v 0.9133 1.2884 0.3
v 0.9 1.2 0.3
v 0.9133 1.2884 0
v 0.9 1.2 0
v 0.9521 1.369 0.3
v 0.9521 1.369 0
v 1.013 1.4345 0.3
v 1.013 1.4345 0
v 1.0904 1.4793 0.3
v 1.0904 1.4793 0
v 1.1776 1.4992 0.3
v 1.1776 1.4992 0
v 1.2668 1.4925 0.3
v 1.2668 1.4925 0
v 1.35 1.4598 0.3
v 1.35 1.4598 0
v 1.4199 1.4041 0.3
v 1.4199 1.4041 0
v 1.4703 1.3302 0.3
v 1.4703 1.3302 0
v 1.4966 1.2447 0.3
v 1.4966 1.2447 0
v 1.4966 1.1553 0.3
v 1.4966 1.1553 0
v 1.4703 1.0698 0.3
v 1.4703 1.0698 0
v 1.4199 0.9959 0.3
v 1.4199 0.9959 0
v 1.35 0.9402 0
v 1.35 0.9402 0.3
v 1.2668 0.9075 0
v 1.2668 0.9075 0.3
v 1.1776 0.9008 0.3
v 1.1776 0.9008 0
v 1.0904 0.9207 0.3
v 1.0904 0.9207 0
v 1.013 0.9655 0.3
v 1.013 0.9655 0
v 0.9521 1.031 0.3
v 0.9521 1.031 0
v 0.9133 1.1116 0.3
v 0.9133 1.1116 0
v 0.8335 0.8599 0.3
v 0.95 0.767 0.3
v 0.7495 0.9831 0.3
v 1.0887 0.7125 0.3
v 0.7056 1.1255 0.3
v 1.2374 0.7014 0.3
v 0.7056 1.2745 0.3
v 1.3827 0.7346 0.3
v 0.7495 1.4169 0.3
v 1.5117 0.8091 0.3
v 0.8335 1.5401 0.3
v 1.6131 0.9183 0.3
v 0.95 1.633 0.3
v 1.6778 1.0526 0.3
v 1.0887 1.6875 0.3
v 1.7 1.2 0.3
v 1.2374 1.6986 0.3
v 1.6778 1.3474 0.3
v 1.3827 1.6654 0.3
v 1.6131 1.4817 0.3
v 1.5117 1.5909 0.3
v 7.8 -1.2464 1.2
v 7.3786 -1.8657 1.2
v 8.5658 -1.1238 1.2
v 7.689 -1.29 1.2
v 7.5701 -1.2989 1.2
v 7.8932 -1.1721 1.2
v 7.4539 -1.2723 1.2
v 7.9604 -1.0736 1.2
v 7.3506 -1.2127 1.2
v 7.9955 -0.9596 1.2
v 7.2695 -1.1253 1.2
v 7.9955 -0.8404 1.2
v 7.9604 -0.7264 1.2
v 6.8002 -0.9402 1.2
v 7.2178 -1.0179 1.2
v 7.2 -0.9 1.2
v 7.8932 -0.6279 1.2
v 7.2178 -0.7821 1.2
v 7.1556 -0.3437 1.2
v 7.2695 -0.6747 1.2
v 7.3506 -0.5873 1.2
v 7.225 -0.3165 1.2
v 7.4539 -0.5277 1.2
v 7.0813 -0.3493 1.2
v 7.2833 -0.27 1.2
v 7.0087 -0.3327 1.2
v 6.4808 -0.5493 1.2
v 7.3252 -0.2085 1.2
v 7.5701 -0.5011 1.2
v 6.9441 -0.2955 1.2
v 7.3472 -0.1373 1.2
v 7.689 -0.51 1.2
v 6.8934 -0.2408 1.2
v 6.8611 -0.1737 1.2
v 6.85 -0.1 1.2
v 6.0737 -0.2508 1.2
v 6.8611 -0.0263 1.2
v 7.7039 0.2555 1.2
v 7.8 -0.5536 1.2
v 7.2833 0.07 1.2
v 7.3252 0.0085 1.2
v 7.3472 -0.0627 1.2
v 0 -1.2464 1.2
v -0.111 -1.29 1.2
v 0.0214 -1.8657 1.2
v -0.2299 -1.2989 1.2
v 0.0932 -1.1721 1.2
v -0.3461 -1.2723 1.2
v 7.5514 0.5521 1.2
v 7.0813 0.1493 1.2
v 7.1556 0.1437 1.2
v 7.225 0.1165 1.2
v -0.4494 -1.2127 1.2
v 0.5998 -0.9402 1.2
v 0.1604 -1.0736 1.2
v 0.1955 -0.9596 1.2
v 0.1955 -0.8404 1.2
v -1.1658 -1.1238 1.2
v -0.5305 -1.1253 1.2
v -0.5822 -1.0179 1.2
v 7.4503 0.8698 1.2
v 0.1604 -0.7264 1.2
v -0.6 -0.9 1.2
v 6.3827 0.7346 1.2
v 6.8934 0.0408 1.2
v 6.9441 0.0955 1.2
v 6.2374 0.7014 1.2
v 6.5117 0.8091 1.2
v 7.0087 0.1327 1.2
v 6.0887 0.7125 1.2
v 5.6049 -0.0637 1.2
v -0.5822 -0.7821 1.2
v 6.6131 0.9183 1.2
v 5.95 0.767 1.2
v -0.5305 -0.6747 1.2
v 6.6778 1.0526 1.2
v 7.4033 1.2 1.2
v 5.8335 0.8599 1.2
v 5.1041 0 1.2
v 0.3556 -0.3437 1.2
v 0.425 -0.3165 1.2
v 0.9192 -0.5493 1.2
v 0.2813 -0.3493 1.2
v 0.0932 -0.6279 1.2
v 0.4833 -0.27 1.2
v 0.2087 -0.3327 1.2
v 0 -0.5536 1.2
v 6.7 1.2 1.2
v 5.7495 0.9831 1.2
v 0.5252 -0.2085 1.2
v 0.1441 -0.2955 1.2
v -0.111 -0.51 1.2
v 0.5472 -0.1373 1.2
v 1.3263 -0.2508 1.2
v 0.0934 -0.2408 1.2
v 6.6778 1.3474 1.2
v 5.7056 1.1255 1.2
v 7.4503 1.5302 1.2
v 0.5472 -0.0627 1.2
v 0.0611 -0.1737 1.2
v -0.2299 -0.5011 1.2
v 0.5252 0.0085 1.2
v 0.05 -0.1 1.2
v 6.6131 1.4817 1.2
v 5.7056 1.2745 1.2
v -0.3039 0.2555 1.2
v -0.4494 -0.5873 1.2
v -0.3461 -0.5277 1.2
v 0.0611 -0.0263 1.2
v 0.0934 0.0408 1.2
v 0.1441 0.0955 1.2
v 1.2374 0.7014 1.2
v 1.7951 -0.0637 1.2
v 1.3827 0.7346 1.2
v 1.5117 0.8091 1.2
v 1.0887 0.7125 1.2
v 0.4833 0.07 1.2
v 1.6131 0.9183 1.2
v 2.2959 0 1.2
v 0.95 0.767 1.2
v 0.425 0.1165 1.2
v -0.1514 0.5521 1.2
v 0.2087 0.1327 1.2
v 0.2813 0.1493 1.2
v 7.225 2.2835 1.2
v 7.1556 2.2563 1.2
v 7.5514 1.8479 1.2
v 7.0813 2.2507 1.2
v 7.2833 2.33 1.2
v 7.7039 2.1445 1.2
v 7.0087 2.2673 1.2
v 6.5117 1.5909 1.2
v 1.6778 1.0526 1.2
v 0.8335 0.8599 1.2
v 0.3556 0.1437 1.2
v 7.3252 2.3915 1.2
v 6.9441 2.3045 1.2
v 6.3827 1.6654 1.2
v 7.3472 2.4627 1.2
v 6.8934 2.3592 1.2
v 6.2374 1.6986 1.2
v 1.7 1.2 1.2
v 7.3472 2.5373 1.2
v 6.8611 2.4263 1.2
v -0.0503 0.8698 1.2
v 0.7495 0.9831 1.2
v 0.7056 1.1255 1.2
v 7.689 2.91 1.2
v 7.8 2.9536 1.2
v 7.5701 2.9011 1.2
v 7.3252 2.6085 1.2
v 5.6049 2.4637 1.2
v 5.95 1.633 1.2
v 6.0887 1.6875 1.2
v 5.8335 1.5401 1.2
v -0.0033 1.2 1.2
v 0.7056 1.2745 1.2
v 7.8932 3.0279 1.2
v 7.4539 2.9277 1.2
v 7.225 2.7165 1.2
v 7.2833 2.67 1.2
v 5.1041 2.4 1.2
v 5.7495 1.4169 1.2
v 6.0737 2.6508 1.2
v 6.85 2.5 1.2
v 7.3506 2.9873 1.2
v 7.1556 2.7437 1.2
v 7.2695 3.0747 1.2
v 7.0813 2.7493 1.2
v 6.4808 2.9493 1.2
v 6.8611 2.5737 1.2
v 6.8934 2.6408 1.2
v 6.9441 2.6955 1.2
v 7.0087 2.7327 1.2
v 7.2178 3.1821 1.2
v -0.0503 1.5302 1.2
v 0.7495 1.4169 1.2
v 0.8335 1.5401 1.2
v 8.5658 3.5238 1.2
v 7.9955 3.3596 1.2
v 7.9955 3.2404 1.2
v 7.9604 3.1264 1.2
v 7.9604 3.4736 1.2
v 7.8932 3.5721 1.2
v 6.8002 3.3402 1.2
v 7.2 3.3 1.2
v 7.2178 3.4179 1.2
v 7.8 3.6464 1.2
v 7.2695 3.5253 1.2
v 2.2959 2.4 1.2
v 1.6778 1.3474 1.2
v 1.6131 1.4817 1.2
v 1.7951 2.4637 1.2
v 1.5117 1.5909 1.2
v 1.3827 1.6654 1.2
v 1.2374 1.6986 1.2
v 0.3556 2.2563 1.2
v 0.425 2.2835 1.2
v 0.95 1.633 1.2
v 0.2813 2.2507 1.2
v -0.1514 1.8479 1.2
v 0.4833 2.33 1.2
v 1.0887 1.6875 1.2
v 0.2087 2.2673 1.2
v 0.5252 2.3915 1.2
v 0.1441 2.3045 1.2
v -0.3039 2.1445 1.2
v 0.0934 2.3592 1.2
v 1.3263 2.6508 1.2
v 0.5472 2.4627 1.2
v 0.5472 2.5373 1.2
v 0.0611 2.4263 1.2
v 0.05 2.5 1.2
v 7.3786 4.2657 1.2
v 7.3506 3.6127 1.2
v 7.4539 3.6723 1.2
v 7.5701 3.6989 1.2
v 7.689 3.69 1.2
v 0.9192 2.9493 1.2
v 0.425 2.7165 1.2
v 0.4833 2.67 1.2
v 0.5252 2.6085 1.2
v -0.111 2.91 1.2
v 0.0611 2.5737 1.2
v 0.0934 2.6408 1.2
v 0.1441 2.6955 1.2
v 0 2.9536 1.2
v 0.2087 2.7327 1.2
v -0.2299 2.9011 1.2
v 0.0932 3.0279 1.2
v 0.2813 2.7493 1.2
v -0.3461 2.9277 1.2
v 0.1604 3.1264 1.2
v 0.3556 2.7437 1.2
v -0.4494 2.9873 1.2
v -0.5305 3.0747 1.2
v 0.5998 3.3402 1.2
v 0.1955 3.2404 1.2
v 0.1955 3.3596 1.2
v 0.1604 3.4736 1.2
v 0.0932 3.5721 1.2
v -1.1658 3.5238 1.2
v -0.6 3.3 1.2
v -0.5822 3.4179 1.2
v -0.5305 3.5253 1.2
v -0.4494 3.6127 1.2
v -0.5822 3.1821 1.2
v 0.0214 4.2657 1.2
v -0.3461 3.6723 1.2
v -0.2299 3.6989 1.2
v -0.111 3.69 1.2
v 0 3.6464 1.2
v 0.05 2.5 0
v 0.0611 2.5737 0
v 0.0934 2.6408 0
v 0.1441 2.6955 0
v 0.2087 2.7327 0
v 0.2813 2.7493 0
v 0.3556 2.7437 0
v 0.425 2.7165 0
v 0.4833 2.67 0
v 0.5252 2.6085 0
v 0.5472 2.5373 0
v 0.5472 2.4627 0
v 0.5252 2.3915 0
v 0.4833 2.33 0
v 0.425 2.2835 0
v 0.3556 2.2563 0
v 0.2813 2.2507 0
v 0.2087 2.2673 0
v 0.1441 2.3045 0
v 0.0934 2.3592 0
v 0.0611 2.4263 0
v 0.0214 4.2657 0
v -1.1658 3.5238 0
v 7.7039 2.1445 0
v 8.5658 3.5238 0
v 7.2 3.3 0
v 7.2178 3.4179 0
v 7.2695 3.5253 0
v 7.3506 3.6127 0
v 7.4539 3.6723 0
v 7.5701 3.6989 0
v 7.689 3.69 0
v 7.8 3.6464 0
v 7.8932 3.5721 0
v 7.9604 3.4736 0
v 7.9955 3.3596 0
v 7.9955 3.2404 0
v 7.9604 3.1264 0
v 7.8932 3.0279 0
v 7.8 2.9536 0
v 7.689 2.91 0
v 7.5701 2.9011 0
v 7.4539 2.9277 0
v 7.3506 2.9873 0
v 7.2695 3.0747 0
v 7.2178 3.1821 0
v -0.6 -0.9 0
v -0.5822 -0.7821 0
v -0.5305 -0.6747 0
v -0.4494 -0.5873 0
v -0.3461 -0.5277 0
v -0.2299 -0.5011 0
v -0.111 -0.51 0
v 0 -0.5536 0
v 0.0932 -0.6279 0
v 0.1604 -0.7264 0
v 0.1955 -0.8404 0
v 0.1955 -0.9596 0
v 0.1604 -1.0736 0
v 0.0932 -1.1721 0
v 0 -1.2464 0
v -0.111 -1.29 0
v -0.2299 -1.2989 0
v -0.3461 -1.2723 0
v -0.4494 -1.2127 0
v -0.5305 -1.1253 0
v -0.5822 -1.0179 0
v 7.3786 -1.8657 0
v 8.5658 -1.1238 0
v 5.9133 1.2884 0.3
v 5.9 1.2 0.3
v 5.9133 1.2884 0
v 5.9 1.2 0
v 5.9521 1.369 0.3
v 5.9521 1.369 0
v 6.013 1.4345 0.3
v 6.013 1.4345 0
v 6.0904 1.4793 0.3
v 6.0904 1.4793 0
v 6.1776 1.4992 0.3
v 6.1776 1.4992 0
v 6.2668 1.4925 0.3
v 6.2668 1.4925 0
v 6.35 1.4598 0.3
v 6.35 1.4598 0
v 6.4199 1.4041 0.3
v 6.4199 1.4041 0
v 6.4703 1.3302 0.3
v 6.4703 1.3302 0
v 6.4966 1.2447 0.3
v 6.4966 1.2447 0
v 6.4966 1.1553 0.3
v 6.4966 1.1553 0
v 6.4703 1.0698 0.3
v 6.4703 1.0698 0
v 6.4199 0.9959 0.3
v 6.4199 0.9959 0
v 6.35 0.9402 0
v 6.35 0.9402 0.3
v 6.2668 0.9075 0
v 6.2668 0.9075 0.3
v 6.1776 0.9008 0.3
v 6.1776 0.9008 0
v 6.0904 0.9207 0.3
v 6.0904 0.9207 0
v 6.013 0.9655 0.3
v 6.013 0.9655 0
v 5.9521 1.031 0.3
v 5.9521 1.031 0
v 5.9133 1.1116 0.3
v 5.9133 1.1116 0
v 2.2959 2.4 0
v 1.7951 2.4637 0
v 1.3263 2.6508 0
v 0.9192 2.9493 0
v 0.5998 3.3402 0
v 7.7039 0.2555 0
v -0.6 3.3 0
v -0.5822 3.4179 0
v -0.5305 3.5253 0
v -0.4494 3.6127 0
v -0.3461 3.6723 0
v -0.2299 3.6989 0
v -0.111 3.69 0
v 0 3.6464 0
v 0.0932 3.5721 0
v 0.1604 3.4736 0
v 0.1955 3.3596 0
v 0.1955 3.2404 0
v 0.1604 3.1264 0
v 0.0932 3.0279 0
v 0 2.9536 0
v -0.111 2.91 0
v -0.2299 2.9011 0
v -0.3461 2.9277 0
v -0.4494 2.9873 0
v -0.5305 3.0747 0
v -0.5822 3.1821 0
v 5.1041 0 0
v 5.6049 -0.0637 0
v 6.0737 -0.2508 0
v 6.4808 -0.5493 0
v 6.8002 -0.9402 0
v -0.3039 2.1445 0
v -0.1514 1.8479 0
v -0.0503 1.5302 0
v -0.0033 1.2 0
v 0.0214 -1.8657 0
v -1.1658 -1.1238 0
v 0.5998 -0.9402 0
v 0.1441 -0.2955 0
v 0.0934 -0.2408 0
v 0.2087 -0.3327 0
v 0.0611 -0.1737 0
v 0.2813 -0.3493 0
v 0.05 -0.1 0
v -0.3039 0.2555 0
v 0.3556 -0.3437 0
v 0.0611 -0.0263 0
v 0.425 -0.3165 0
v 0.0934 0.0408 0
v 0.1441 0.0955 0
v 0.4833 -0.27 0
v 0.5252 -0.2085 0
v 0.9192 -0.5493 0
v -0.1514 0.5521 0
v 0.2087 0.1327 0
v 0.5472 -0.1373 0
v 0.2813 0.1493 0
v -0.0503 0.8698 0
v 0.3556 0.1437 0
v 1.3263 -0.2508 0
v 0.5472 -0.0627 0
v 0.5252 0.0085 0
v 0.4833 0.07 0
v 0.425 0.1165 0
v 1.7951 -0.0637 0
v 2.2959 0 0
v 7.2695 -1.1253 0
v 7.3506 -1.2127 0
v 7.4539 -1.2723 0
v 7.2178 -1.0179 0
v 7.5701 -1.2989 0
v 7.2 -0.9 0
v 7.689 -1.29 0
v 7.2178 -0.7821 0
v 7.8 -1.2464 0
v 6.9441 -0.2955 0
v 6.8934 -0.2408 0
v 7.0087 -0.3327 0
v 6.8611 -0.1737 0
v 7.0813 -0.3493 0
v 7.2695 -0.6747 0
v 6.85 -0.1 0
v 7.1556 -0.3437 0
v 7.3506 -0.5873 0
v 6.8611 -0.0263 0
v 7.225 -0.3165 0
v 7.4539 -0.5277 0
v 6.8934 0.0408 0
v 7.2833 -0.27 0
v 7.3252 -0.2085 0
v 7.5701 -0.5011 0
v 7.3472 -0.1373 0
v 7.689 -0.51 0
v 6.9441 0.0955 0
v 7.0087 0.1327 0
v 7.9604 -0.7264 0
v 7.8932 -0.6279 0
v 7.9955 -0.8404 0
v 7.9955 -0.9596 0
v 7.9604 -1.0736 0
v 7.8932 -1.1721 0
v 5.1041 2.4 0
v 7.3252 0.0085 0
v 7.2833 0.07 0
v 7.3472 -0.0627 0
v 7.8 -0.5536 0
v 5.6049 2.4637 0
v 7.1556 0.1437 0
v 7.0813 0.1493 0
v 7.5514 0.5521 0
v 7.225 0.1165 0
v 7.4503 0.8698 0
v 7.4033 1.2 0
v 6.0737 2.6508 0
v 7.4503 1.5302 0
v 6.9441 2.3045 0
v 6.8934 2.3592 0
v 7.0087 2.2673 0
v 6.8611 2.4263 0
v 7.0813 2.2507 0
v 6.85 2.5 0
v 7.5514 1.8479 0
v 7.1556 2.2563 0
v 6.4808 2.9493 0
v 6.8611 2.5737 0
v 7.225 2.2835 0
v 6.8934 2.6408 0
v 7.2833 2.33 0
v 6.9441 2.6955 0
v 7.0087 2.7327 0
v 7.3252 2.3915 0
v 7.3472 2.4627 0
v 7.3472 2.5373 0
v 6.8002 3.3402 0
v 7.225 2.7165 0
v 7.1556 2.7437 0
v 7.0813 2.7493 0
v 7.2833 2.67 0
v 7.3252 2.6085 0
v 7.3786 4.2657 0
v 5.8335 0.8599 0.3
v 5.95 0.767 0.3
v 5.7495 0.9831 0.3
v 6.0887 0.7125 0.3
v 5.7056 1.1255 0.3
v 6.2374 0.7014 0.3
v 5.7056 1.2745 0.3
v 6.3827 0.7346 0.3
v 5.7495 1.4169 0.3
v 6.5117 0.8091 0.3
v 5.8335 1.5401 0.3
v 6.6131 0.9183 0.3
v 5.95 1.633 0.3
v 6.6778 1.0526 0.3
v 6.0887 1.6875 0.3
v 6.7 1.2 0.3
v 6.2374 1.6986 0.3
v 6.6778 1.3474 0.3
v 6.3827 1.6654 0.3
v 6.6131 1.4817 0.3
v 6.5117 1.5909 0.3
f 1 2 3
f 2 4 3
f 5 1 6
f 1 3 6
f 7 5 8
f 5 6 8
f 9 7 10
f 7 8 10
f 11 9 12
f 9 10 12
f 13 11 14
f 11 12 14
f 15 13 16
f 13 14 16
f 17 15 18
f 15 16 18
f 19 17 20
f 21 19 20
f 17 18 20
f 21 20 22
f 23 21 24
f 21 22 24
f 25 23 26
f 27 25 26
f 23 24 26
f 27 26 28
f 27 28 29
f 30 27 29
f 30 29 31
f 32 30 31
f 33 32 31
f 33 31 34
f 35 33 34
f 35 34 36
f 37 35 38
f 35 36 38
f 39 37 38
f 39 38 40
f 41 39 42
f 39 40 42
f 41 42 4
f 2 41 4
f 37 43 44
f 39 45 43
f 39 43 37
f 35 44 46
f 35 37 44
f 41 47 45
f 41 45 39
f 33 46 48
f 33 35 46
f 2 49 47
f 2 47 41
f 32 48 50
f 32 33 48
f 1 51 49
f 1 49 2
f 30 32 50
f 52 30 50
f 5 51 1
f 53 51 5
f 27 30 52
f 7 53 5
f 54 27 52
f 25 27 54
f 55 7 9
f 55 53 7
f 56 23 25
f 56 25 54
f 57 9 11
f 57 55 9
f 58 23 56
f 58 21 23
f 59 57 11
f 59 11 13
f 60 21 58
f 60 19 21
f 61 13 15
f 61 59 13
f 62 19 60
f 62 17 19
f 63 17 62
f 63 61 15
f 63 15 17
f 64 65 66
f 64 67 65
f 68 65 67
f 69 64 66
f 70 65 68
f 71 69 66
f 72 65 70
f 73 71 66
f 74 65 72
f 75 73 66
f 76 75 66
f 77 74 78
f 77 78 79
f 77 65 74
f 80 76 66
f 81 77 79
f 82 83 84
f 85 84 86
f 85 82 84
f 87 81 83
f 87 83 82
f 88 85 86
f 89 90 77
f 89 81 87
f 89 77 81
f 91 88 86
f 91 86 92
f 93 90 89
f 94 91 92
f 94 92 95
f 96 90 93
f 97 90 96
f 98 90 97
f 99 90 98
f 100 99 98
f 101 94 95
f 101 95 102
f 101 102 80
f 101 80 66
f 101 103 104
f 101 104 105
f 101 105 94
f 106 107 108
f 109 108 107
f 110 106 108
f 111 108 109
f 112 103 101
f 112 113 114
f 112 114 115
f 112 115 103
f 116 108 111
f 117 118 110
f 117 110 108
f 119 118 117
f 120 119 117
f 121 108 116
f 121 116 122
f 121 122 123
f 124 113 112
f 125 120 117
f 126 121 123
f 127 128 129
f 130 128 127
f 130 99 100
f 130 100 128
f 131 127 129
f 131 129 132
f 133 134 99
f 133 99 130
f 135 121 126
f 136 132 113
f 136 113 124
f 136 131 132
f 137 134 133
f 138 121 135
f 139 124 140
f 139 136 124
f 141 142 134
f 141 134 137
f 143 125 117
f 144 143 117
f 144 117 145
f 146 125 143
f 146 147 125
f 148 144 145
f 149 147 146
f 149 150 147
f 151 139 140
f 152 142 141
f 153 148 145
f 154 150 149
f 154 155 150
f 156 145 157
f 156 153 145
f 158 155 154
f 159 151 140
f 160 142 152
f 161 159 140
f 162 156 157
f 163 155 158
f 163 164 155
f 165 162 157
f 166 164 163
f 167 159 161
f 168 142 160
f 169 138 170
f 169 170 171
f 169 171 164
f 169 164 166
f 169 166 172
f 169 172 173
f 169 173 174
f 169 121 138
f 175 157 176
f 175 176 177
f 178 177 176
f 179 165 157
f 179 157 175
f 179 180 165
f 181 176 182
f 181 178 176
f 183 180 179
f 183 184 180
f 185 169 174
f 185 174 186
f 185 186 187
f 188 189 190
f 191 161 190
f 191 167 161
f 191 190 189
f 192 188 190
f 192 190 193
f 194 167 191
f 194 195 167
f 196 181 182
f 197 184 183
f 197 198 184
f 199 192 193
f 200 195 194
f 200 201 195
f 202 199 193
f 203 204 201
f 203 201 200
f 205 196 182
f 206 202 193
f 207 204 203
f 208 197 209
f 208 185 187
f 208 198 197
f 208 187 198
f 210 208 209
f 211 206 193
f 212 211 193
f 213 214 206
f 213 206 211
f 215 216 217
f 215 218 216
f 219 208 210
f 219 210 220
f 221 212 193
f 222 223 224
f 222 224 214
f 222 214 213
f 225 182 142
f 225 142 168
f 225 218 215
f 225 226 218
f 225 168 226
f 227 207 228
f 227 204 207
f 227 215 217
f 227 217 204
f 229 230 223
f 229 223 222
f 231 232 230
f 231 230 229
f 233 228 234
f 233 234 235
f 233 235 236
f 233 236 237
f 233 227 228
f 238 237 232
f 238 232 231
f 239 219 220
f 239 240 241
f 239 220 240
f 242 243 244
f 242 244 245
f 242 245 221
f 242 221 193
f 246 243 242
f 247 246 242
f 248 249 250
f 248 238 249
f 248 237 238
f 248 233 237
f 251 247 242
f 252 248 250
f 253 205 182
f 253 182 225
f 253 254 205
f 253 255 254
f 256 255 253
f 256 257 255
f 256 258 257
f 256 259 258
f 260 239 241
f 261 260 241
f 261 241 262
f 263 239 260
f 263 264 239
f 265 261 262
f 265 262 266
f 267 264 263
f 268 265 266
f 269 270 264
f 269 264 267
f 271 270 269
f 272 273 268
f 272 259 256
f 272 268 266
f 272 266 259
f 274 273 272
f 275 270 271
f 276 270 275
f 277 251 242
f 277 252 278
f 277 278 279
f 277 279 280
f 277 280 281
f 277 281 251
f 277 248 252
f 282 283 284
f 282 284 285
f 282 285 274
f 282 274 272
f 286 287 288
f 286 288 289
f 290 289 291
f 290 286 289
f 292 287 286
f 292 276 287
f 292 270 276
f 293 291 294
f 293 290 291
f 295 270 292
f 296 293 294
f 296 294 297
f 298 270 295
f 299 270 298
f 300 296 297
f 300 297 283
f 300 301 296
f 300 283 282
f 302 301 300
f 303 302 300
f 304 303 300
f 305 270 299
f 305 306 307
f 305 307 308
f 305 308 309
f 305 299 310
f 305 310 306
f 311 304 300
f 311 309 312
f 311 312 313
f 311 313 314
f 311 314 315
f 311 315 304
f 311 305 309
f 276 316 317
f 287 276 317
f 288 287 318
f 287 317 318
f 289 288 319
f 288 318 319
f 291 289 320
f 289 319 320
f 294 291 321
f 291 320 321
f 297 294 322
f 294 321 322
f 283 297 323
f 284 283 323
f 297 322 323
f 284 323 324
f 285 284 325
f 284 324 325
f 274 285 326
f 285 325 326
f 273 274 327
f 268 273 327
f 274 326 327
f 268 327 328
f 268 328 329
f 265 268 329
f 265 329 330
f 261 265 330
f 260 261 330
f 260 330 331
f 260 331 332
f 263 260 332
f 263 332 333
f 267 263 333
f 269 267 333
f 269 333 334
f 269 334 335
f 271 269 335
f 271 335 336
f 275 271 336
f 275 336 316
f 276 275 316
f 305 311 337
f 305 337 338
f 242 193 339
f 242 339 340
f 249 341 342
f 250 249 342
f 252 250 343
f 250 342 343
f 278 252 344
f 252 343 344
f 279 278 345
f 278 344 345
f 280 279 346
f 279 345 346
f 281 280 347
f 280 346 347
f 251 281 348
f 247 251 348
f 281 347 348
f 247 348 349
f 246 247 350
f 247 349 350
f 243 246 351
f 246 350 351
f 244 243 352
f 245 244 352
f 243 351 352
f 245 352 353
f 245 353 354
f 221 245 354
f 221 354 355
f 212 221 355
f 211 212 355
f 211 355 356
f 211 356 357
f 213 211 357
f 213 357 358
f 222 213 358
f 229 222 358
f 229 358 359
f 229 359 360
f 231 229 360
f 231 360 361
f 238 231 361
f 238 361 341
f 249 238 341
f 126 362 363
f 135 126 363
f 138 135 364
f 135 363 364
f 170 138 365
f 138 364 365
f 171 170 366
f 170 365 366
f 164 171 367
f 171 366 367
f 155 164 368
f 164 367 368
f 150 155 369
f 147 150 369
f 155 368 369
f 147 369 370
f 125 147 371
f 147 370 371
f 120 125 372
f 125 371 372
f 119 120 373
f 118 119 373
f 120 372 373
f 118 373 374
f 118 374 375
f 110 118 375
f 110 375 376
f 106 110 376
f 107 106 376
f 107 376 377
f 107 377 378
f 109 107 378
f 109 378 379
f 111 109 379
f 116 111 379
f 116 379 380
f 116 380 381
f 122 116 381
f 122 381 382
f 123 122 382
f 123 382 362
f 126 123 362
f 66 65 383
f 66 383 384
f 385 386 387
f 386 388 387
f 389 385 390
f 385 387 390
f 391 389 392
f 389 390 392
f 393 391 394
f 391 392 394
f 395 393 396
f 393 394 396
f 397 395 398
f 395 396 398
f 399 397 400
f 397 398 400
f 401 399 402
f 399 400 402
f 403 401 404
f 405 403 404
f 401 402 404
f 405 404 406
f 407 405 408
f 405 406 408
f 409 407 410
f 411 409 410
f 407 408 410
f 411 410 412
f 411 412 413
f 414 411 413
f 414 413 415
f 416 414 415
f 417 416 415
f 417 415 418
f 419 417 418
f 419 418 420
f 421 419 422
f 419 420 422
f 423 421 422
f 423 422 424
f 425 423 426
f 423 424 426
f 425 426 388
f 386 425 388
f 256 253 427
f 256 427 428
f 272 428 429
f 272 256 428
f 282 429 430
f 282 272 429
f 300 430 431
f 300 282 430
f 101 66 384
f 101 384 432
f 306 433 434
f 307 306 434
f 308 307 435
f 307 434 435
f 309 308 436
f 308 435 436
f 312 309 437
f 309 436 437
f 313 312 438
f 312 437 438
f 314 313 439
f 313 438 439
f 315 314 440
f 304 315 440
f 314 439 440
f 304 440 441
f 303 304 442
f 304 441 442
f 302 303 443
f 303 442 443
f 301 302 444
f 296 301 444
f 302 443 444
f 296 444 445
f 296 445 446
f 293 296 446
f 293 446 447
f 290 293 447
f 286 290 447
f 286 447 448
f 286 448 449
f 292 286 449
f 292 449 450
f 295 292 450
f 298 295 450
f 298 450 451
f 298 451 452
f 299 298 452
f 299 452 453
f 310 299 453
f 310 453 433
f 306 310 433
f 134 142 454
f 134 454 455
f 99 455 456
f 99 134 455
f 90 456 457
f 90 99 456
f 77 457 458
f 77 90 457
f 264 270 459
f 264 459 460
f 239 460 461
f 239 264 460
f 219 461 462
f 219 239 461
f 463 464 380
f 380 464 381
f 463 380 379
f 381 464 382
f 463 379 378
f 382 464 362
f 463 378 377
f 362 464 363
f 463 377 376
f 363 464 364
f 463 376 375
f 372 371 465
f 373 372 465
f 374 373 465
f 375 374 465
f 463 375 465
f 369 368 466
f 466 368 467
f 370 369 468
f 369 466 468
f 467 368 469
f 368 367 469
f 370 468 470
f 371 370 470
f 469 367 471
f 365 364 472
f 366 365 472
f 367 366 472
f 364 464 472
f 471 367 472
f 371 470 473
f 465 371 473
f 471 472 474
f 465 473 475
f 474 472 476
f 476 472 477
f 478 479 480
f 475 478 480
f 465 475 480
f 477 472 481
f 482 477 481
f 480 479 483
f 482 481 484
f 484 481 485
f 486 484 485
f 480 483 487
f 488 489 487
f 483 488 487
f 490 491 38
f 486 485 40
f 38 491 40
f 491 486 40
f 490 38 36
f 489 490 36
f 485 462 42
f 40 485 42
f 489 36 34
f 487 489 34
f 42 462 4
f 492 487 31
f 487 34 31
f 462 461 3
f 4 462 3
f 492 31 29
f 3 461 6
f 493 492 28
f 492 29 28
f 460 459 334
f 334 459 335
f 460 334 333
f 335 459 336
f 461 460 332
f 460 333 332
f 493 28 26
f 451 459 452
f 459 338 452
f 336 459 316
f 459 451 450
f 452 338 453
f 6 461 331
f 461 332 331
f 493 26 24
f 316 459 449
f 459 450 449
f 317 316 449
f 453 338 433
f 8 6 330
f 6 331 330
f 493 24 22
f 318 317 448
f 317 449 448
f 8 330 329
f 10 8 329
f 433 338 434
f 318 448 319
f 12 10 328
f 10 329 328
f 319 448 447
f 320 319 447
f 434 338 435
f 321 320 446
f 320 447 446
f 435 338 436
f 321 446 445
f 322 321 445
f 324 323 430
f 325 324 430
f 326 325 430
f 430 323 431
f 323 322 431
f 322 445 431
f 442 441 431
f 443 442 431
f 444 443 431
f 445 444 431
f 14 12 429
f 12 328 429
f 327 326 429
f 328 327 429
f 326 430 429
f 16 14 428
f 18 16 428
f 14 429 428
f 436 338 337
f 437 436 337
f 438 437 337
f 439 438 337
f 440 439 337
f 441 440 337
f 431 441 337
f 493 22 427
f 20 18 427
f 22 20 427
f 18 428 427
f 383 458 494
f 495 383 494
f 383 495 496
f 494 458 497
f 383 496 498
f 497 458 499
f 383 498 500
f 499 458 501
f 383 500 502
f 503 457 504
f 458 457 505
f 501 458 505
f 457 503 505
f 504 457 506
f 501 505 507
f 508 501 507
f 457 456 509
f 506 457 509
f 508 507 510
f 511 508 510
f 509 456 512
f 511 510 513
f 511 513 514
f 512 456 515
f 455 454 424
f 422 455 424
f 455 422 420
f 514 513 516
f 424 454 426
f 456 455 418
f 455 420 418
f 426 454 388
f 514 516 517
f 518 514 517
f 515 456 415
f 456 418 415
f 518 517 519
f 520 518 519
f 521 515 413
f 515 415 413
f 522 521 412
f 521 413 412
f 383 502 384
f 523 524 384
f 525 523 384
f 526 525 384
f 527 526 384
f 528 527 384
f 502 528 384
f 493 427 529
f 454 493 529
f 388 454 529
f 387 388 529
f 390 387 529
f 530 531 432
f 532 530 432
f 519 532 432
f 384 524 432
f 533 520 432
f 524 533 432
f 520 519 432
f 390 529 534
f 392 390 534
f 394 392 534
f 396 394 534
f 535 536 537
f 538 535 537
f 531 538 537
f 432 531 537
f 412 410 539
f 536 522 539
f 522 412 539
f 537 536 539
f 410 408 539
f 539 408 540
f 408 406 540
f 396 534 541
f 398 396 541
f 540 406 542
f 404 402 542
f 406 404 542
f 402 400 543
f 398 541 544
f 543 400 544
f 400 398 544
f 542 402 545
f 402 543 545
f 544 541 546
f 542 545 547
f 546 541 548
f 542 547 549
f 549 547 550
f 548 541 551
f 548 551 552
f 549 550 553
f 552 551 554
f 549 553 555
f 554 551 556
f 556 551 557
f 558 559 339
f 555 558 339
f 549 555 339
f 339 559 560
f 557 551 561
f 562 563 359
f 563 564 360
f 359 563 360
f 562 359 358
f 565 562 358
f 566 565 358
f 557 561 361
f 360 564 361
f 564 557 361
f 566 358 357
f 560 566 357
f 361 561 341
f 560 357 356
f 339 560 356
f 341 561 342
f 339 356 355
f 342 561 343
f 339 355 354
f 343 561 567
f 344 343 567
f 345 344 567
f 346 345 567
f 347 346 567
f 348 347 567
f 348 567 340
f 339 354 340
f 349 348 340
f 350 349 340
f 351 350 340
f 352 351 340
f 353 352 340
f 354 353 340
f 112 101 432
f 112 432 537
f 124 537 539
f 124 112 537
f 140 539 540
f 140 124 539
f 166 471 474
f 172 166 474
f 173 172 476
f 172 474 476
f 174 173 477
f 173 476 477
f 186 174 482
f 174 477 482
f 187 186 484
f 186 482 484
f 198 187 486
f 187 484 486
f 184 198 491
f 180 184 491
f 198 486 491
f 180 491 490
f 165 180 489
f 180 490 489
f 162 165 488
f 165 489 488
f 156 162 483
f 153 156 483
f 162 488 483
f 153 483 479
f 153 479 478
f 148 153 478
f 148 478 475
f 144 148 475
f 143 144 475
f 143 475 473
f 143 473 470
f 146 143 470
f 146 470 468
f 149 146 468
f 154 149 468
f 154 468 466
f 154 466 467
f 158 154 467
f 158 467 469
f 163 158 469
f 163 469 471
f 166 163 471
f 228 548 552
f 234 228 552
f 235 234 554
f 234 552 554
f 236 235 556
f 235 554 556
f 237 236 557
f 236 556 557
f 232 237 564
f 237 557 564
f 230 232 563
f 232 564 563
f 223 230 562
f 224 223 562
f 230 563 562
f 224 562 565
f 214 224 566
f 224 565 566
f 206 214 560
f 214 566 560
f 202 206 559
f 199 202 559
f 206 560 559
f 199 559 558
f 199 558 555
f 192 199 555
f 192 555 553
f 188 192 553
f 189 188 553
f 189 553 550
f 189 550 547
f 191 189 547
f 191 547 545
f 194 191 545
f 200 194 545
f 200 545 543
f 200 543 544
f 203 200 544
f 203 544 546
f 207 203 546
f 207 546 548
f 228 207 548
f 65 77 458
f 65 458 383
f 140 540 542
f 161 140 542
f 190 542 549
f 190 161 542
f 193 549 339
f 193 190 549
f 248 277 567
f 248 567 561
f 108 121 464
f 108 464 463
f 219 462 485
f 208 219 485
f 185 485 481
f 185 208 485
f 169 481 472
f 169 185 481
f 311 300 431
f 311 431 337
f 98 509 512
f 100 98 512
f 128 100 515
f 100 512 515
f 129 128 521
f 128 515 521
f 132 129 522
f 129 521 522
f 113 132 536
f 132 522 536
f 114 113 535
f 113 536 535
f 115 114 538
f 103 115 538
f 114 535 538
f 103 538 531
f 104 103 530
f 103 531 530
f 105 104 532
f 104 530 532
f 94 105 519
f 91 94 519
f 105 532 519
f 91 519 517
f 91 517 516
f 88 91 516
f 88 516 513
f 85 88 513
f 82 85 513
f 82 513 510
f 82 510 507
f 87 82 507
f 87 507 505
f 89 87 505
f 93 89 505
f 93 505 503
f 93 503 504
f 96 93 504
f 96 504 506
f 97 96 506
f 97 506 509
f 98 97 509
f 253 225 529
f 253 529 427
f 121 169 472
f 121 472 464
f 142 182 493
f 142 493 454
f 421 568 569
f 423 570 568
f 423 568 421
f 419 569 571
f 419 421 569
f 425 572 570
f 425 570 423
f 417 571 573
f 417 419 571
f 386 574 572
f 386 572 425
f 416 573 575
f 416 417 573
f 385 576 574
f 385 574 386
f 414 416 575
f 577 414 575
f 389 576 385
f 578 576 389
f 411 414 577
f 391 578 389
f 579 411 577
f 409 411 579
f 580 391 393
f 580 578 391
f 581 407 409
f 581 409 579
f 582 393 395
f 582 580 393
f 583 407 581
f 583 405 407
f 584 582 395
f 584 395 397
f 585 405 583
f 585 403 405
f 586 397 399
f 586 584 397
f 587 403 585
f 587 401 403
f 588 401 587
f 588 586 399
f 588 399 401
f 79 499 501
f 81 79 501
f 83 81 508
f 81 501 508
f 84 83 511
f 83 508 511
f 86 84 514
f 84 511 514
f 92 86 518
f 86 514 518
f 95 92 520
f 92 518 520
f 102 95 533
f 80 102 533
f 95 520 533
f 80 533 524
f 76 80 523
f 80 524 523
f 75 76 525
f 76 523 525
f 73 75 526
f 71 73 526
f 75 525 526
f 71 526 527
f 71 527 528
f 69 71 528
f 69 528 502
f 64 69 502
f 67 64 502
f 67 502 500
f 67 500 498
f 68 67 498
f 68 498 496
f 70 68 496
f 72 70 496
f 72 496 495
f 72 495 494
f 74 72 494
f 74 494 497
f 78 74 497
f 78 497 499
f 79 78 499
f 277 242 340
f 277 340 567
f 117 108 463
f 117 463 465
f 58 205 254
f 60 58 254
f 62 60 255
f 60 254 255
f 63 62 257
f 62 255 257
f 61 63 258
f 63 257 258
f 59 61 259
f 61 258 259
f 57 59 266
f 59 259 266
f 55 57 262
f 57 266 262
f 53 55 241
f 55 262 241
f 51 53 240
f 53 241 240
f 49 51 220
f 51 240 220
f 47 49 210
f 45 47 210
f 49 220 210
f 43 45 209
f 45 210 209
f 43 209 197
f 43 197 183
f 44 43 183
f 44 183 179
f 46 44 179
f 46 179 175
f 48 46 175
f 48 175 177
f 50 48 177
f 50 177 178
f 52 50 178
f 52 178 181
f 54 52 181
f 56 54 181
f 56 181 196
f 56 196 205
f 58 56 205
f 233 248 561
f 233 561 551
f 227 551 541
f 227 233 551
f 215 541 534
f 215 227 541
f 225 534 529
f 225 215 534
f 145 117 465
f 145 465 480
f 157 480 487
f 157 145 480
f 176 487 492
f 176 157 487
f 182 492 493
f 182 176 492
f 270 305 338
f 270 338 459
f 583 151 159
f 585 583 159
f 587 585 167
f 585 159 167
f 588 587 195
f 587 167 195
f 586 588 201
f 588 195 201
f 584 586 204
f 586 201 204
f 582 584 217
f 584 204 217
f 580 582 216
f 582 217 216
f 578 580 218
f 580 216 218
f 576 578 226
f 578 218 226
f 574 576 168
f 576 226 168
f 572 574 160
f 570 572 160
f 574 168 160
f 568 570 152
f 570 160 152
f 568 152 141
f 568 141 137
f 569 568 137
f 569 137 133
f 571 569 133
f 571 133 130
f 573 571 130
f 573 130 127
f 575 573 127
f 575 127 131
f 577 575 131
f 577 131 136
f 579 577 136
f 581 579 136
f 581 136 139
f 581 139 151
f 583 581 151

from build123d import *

# Parameters (mm, degrees)
BOSS_EXTRUDE1_DEPTH        = 1.2
HOLE1_D                    = 0.6
HOLE1_CBORE_D              = 1
HOLE1_CBORE_DEPTH          = 0.9
FILLET1_R                  = 2
F_0_8_0_8_DIAMETER_HOLE1_D = 0.8
F_0_5_0_5_DIAMETER_HOLE1_D = 0.5


with BuildPart() as part:
    # Sketch1 → Boss-Extrude1 (new body)
    with BuildSketch(Plane.XY.offset(1.2)):
        Polygon((0.021444953, -1.865705812), (1.187267335, 0), (6.212732665, 0), (7.378555047, -1.865705812), (8.565822381, -1.123818842), (7.4, 0.74188697), (7.4, 1.65811303), (8.565822381, 3.523818842), (7.378555047, 4.265705812), (6.212732665, 2.4), (1.187267335, 2.4), (0.021444953, 4.265705812), (-1.165822381, 3.523818842), (0, 1.65811303), (0, 0.74188697), (-1.165822381, -1.123818842), align=None)
    extrude(amount=-BOSS_EXTRUDE1_DEPTH)

    # Hole1 (through all)
    with Locations(Plane.XY.offset(1.2)):
        with Locations((1.2, 1.2), (6.2, 1.2)):
            CounterBoreHole(HOLE1_D / 2, HOLE1_CBORE_D / 2, HOLE1_CBORE_DEPTH)

    # Fillet1
    # the kernel refuses this fillet: 2 mm, written as the material it adds along each edge
    with BuildSketch(Plane(origin=(6.212732665, 2.4, 1.2), x_dir=(-1, 0, 0), z_dir=(0, 0, -1)), Plane(origin=(1.187267335, 2.4, 1.2), x_dir=(-0.5299192642332093, 0.8480480961564231, 0), z_dir=(0, 0, -1))) as fillet1_piece_1:
        with BuildLine():
            CenterArc((FILLET1_R * 0.554309051453, FILLET1_R), FILLET1_R, 212, 58)
            Line((-FILLET1_R * 0.293739044704, FILLET1_R * 0.470080735767), (0, 0))
            Line((0, 0), (FILLET1_R * 0.554309051453, 0))
        make_face()
    extrude(amount=1.2)
    with BuildSketch(Plane(origin=(7.4, 1.65811303, 1.2), x_dir=(0, -1, 0), z_dir=(0, 0, -1)), Plane(origin=(7.4, 0.74188697, 1.2), x_dir=(0.5299192642332092, -0.8480480961564232, 0), z_dir=(0, 0, -1))) as fillet1_piece_2:
        with BuildLine():
            CenterArc((FILLET1_R * 0.286745385759, -FILLET1_R), FILLET1_R, 90, 32)
            Line((-FILLET1_R * 0.243173878474, -FILLET1_R * 0.151951903844), (0, 0))
            Line((0, 0), (FILLET1_R * 0.286745385759, 0))
        make_face()
    extrude(amount=1.2)
    with BuildSketch(Plane(origin=(6.212732665, 0, 1.2), x_dir=(-1, 0, 0), z_dir=(0, 0, -1)), Plane(origin=(1.187267335, 0, 1.2), x_dir=(-0.5299192642332091, -0.8480480961564235, 0), z_dir=(0, 0, -1))) as fillet1_piece_3:
        with BuildLine():
            CenterArc((FILLET1_R * 0.554309051453, -FILLET1_R), FILLET1_R, 90, 58)
            Line((-FILLET1_R * 0.293739044704, -FILLET1_R * 0.470080735767), (0, 0))
            Line((0, 0), (FILLET1_R * 0.554309051453, 0))
        make_face()
    extrude(amount=1.2)
    with BuildSketch(Plane(origin=(0, 0.74188697, 1.2), x_dir=(-0.5299192642332088, -0.8480480961564235, 0), z_dir=(0, 0, -1)), Plane(origin=(0, 1.65811303, 1.2), x_dir=(0, -1, 0), z_dir=(0, 0, -1))) as fillet1_piece_4:
        with BuildLine():
            CenterArc((FILLET1_R * 0.286745385759, FILLET1_R), FILLET1_R, 238, 32)
            Line((-FILLET1_R * 0.243173878474, FILLET1_R * 0.151951903844), (0, 0))
            Line((0, 0), (FILLET1_R * 0.286745385759, 0))
        make_face()
    extrude(amount=1.2)

    # Ø0.8 (0.8) Diameter Hole1 (through all)
    with Locations(Plane.XY.offset(1.2)):
        with Locations((-0.2, 3.3), (7.6, 3.3), (-0.2, -0.9), (7.6, -0.9)):
            Hole(F_0_8_0_8_DIAMETER_HOLE1_D / 2)

    # Ø0.5 (0.5) Diameter Hole1 (through all)
    with Locations(Plane.XY.offset(1.2)):
        with Locations((7.1, -0.1), (0.3, -0.1), (0.3, 2.5), (7.1, 2.5)):
            Hole(F_0_5_0_5_DIAMETER_HOLE1_D / 2)


solid = part.part
